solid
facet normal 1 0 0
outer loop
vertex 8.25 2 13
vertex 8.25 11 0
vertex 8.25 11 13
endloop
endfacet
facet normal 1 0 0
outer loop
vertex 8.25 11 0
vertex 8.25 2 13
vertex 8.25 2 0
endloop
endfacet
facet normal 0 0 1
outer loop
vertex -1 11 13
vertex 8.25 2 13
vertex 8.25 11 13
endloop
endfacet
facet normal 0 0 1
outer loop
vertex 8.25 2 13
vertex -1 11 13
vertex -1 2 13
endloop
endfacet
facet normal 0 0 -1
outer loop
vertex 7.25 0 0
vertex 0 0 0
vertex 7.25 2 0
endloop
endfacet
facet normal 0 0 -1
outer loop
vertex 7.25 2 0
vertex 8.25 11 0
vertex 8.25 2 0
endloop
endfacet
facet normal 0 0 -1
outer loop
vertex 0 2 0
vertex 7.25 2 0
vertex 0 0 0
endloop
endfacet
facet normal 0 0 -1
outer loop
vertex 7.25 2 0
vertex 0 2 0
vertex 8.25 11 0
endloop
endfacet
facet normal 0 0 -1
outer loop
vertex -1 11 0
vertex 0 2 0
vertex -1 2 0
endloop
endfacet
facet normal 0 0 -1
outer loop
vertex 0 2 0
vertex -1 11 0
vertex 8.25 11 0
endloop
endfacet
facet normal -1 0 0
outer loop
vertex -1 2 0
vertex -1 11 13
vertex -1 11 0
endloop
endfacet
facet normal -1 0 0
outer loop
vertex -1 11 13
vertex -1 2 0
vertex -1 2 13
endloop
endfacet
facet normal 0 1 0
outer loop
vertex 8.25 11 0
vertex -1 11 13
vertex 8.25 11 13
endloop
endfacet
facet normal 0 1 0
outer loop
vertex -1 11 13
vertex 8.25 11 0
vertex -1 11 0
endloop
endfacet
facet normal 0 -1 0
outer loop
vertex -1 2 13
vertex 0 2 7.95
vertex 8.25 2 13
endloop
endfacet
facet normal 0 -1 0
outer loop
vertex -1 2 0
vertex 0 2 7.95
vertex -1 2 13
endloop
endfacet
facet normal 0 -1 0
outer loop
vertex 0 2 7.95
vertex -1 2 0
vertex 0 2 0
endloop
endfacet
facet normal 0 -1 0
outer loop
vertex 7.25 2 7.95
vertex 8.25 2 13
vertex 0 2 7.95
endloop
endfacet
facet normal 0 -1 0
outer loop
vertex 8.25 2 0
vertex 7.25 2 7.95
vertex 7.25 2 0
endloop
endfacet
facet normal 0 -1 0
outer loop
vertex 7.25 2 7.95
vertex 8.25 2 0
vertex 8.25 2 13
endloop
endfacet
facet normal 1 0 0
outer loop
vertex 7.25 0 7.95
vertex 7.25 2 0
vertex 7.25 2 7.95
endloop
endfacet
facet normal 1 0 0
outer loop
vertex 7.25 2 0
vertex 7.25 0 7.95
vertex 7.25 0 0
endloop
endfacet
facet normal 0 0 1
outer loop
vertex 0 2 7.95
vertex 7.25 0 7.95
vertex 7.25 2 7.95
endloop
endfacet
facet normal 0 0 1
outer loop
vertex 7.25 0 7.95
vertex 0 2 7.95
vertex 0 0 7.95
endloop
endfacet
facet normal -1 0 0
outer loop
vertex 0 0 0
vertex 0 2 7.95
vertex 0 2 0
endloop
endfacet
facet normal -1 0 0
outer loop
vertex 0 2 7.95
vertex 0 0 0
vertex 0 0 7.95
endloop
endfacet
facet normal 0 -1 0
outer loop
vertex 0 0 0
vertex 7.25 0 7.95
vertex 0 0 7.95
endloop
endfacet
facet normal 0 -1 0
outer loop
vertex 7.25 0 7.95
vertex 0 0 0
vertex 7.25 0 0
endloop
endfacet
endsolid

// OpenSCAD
cutExtra = 1;

// sample
ledHole(width = 10);

module ledHole(width, clearence = 0.25) {
  //caja led: w=7 h=7.7 d=5.3
  hole1Width = 7 + clearence;
  hole1Height = 7.7 + clearence;
  hole1Depth = 2;

  hole2Width = hole1Width + 2;
  hole2Height = 13;
  hole2Depth = width - hole1Depth + cutExtra;

  translate([-(hole2Width - hole1Width) / 2, hole1Depth, 0])
  cube([hole2Width, hole2Depth, hole2Height]);

  cube([hole1Width, hole1Depth, hole1Height]);
}
